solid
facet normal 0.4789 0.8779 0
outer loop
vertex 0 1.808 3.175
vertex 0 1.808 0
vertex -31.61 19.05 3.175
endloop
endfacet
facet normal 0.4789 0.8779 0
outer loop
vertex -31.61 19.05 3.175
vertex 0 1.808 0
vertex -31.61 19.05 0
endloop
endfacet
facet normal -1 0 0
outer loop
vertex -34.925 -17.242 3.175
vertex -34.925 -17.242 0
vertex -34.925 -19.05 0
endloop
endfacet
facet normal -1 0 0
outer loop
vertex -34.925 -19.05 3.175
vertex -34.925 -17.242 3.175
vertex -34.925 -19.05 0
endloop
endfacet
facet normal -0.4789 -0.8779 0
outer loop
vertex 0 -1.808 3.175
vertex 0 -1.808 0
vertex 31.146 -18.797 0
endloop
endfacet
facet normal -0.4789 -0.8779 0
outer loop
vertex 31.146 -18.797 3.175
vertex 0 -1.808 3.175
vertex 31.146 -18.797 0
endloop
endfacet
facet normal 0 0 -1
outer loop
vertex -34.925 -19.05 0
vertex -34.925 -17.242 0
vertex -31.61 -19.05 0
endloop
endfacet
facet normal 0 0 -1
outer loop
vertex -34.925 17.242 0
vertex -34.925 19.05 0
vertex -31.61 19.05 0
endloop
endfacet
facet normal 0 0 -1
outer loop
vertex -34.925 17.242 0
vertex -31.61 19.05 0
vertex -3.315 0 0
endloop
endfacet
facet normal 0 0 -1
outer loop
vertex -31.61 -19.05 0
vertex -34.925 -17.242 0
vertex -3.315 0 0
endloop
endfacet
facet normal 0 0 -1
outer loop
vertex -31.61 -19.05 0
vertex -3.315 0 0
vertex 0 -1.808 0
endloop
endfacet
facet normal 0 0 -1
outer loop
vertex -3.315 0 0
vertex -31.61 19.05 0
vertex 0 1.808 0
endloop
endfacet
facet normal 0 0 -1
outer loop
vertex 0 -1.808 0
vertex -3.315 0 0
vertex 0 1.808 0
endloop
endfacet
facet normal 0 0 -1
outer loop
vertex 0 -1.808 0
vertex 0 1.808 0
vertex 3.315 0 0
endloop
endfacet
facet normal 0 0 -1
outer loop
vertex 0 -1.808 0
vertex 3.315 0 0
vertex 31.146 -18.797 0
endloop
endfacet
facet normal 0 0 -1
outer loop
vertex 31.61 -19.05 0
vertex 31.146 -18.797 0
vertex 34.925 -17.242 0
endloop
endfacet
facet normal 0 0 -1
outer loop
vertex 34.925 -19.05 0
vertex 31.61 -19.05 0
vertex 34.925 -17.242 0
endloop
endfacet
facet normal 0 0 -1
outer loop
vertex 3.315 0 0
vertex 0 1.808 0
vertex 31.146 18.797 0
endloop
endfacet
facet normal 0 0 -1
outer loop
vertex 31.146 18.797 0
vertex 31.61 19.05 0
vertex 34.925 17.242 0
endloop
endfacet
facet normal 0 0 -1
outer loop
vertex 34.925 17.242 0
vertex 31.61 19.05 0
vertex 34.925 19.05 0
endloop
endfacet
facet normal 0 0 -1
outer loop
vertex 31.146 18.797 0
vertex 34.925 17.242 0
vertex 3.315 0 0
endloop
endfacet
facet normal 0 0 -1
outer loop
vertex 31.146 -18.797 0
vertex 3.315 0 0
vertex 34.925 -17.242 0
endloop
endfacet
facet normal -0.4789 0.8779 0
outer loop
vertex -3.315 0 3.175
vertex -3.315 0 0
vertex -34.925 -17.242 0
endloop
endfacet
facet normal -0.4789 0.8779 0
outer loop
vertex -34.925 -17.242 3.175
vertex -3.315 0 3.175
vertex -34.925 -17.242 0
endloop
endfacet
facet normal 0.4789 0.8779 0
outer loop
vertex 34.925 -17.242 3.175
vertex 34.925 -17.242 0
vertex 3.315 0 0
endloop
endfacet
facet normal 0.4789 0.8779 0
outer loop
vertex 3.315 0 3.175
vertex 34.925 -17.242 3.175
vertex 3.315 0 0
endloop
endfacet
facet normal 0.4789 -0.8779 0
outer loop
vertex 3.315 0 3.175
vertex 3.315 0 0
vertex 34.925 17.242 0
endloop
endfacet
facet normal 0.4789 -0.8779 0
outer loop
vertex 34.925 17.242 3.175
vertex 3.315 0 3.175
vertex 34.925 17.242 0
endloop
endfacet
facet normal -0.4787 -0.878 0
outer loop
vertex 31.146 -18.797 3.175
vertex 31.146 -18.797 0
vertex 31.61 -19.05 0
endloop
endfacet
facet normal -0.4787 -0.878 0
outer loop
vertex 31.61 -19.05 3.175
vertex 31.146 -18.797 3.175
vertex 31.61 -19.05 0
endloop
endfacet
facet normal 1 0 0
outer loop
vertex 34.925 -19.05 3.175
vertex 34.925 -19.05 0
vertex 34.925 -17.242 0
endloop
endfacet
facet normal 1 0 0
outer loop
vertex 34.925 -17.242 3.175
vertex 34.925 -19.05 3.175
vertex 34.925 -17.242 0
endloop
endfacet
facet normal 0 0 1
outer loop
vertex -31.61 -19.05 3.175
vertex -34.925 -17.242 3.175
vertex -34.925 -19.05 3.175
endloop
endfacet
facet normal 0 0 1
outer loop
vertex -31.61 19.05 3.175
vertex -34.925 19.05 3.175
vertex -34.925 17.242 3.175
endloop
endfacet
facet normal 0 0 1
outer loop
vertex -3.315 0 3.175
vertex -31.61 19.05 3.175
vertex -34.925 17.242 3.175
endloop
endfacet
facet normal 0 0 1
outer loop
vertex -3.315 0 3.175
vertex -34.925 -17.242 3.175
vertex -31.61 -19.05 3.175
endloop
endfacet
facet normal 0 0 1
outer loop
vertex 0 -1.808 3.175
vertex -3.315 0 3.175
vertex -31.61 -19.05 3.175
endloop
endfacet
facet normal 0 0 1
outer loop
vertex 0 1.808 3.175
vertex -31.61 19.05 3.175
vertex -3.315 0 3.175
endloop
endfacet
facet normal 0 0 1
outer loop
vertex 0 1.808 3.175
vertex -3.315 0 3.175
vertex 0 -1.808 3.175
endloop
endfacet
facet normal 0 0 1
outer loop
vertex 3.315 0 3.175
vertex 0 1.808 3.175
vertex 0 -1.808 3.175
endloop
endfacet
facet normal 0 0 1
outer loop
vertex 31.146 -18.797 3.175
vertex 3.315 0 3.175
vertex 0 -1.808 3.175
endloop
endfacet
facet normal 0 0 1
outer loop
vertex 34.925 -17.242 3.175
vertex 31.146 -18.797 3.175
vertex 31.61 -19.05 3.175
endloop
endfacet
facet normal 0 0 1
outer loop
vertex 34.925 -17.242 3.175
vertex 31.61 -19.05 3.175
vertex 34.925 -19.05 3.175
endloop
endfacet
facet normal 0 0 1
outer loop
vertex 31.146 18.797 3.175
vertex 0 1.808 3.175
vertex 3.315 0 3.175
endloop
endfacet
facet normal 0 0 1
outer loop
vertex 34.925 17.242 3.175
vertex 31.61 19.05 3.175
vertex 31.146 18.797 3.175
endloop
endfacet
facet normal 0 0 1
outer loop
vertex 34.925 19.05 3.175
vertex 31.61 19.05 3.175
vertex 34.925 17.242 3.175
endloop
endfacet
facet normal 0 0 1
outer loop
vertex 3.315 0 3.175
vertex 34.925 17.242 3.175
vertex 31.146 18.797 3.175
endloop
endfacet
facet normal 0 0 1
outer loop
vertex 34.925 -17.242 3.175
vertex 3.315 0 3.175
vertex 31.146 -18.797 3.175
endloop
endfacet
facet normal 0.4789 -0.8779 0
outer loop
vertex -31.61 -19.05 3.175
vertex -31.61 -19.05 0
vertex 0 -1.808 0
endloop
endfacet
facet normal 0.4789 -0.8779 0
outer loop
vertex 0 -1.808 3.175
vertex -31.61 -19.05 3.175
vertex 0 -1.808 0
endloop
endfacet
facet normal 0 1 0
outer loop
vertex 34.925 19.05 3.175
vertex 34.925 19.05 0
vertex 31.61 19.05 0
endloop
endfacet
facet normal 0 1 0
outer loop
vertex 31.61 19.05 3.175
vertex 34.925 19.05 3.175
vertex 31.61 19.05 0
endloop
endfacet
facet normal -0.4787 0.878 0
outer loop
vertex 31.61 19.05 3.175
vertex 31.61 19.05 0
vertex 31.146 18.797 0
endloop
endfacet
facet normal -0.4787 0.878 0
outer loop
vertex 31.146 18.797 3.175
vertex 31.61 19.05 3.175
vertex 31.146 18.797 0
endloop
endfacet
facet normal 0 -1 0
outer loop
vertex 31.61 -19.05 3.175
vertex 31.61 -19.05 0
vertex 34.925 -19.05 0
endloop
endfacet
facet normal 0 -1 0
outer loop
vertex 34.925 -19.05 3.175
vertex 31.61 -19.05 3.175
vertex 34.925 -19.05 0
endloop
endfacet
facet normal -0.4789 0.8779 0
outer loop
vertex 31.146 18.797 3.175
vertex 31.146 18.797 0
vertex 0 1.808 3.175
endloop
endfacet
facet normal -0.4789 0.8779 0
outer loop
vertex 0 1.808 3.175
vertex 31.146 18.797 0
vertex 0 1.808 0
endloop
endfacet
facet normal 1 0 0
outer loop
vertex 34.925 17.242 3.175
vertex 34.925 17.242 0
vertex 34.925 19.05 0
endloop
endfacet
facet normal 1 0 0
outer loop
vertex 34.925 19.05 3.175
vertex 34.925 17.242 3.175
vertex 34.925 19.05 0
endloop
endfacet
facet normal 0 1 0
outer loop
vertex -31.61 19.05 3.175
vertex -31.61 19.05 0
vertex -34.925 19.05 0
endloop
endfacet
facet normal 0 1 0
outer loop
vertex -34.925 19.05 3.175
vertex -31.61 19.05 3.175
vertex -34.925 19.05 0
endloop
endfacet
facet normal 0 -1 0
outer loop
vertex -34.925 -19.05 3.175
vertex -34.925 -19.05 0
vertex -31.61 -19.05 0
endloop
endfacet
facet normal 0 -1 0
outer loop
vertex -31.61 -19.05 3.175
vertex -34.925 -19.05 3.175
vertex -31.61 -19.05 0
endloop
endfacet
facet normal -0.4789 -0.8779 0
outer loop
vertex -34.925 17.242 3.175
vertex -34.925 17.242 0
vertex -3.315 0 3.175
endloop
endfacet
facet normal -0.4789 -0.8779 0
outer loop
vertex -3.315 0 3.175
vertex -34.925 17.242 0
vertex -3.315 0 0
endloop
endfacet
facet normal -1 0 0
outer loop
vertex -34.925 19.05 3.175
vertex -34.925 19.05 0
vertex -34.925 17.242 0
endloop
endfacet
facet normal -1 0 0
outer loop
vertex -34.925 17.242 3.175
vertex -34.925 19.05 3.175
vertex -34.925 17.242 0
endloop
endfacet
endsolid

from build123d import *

# Parameters (mm, degrees)
F1_DEPTH = 3.175


with BuildPart() as f1:
    # F0 (on Top) → F1 (new body)
    with BuildSketch(Plane.XY):
        Polygon((-2.19725e-05, 1.8082891047), (3.3151988725, -1.31744e-05), (34.9249756667, 17.2416605767), (34.9250459451, 19.05), (31.6098229194, 19.05), (31.1458046464, 18.7968994568), align=None)
        Polygon((-34.9250459451, -19.05), (-31.6098262806, -19.0500018334), (-2.29725e-05, -1.8083136201), (-3.3152438176, -1.1341e-05), (-34.925044945, -17.2416983649), align=None)
        Polygon((-34.9250449451, 17.2416983649), (-3.3152438176, -1.1341e-05), (-2.19725e-05, 1.8082891047), (-31.6098252806, 19.05), (-34.9250449451, 19.05), align=None)
        Polygon((3.3151988725, -1.31744e-05), (-2.29725e-05, -1.8083136201), (31.145784716, -18.7969359957), (31.609802849, -19.0500367955), (34.9250258747, -19.0500386289), (34.9249550549, -17.2416983648), align=None)
        Polygon((-3.3152438176, -1.1341e-05), (-2.29725e-05, -1.8083136201), (3.3151988725, -1.31744e-05), (-2.19725e-05, 1.8082891047), align=None)
    extrude(amount=F1_DEPTH)


solid = f1.part
